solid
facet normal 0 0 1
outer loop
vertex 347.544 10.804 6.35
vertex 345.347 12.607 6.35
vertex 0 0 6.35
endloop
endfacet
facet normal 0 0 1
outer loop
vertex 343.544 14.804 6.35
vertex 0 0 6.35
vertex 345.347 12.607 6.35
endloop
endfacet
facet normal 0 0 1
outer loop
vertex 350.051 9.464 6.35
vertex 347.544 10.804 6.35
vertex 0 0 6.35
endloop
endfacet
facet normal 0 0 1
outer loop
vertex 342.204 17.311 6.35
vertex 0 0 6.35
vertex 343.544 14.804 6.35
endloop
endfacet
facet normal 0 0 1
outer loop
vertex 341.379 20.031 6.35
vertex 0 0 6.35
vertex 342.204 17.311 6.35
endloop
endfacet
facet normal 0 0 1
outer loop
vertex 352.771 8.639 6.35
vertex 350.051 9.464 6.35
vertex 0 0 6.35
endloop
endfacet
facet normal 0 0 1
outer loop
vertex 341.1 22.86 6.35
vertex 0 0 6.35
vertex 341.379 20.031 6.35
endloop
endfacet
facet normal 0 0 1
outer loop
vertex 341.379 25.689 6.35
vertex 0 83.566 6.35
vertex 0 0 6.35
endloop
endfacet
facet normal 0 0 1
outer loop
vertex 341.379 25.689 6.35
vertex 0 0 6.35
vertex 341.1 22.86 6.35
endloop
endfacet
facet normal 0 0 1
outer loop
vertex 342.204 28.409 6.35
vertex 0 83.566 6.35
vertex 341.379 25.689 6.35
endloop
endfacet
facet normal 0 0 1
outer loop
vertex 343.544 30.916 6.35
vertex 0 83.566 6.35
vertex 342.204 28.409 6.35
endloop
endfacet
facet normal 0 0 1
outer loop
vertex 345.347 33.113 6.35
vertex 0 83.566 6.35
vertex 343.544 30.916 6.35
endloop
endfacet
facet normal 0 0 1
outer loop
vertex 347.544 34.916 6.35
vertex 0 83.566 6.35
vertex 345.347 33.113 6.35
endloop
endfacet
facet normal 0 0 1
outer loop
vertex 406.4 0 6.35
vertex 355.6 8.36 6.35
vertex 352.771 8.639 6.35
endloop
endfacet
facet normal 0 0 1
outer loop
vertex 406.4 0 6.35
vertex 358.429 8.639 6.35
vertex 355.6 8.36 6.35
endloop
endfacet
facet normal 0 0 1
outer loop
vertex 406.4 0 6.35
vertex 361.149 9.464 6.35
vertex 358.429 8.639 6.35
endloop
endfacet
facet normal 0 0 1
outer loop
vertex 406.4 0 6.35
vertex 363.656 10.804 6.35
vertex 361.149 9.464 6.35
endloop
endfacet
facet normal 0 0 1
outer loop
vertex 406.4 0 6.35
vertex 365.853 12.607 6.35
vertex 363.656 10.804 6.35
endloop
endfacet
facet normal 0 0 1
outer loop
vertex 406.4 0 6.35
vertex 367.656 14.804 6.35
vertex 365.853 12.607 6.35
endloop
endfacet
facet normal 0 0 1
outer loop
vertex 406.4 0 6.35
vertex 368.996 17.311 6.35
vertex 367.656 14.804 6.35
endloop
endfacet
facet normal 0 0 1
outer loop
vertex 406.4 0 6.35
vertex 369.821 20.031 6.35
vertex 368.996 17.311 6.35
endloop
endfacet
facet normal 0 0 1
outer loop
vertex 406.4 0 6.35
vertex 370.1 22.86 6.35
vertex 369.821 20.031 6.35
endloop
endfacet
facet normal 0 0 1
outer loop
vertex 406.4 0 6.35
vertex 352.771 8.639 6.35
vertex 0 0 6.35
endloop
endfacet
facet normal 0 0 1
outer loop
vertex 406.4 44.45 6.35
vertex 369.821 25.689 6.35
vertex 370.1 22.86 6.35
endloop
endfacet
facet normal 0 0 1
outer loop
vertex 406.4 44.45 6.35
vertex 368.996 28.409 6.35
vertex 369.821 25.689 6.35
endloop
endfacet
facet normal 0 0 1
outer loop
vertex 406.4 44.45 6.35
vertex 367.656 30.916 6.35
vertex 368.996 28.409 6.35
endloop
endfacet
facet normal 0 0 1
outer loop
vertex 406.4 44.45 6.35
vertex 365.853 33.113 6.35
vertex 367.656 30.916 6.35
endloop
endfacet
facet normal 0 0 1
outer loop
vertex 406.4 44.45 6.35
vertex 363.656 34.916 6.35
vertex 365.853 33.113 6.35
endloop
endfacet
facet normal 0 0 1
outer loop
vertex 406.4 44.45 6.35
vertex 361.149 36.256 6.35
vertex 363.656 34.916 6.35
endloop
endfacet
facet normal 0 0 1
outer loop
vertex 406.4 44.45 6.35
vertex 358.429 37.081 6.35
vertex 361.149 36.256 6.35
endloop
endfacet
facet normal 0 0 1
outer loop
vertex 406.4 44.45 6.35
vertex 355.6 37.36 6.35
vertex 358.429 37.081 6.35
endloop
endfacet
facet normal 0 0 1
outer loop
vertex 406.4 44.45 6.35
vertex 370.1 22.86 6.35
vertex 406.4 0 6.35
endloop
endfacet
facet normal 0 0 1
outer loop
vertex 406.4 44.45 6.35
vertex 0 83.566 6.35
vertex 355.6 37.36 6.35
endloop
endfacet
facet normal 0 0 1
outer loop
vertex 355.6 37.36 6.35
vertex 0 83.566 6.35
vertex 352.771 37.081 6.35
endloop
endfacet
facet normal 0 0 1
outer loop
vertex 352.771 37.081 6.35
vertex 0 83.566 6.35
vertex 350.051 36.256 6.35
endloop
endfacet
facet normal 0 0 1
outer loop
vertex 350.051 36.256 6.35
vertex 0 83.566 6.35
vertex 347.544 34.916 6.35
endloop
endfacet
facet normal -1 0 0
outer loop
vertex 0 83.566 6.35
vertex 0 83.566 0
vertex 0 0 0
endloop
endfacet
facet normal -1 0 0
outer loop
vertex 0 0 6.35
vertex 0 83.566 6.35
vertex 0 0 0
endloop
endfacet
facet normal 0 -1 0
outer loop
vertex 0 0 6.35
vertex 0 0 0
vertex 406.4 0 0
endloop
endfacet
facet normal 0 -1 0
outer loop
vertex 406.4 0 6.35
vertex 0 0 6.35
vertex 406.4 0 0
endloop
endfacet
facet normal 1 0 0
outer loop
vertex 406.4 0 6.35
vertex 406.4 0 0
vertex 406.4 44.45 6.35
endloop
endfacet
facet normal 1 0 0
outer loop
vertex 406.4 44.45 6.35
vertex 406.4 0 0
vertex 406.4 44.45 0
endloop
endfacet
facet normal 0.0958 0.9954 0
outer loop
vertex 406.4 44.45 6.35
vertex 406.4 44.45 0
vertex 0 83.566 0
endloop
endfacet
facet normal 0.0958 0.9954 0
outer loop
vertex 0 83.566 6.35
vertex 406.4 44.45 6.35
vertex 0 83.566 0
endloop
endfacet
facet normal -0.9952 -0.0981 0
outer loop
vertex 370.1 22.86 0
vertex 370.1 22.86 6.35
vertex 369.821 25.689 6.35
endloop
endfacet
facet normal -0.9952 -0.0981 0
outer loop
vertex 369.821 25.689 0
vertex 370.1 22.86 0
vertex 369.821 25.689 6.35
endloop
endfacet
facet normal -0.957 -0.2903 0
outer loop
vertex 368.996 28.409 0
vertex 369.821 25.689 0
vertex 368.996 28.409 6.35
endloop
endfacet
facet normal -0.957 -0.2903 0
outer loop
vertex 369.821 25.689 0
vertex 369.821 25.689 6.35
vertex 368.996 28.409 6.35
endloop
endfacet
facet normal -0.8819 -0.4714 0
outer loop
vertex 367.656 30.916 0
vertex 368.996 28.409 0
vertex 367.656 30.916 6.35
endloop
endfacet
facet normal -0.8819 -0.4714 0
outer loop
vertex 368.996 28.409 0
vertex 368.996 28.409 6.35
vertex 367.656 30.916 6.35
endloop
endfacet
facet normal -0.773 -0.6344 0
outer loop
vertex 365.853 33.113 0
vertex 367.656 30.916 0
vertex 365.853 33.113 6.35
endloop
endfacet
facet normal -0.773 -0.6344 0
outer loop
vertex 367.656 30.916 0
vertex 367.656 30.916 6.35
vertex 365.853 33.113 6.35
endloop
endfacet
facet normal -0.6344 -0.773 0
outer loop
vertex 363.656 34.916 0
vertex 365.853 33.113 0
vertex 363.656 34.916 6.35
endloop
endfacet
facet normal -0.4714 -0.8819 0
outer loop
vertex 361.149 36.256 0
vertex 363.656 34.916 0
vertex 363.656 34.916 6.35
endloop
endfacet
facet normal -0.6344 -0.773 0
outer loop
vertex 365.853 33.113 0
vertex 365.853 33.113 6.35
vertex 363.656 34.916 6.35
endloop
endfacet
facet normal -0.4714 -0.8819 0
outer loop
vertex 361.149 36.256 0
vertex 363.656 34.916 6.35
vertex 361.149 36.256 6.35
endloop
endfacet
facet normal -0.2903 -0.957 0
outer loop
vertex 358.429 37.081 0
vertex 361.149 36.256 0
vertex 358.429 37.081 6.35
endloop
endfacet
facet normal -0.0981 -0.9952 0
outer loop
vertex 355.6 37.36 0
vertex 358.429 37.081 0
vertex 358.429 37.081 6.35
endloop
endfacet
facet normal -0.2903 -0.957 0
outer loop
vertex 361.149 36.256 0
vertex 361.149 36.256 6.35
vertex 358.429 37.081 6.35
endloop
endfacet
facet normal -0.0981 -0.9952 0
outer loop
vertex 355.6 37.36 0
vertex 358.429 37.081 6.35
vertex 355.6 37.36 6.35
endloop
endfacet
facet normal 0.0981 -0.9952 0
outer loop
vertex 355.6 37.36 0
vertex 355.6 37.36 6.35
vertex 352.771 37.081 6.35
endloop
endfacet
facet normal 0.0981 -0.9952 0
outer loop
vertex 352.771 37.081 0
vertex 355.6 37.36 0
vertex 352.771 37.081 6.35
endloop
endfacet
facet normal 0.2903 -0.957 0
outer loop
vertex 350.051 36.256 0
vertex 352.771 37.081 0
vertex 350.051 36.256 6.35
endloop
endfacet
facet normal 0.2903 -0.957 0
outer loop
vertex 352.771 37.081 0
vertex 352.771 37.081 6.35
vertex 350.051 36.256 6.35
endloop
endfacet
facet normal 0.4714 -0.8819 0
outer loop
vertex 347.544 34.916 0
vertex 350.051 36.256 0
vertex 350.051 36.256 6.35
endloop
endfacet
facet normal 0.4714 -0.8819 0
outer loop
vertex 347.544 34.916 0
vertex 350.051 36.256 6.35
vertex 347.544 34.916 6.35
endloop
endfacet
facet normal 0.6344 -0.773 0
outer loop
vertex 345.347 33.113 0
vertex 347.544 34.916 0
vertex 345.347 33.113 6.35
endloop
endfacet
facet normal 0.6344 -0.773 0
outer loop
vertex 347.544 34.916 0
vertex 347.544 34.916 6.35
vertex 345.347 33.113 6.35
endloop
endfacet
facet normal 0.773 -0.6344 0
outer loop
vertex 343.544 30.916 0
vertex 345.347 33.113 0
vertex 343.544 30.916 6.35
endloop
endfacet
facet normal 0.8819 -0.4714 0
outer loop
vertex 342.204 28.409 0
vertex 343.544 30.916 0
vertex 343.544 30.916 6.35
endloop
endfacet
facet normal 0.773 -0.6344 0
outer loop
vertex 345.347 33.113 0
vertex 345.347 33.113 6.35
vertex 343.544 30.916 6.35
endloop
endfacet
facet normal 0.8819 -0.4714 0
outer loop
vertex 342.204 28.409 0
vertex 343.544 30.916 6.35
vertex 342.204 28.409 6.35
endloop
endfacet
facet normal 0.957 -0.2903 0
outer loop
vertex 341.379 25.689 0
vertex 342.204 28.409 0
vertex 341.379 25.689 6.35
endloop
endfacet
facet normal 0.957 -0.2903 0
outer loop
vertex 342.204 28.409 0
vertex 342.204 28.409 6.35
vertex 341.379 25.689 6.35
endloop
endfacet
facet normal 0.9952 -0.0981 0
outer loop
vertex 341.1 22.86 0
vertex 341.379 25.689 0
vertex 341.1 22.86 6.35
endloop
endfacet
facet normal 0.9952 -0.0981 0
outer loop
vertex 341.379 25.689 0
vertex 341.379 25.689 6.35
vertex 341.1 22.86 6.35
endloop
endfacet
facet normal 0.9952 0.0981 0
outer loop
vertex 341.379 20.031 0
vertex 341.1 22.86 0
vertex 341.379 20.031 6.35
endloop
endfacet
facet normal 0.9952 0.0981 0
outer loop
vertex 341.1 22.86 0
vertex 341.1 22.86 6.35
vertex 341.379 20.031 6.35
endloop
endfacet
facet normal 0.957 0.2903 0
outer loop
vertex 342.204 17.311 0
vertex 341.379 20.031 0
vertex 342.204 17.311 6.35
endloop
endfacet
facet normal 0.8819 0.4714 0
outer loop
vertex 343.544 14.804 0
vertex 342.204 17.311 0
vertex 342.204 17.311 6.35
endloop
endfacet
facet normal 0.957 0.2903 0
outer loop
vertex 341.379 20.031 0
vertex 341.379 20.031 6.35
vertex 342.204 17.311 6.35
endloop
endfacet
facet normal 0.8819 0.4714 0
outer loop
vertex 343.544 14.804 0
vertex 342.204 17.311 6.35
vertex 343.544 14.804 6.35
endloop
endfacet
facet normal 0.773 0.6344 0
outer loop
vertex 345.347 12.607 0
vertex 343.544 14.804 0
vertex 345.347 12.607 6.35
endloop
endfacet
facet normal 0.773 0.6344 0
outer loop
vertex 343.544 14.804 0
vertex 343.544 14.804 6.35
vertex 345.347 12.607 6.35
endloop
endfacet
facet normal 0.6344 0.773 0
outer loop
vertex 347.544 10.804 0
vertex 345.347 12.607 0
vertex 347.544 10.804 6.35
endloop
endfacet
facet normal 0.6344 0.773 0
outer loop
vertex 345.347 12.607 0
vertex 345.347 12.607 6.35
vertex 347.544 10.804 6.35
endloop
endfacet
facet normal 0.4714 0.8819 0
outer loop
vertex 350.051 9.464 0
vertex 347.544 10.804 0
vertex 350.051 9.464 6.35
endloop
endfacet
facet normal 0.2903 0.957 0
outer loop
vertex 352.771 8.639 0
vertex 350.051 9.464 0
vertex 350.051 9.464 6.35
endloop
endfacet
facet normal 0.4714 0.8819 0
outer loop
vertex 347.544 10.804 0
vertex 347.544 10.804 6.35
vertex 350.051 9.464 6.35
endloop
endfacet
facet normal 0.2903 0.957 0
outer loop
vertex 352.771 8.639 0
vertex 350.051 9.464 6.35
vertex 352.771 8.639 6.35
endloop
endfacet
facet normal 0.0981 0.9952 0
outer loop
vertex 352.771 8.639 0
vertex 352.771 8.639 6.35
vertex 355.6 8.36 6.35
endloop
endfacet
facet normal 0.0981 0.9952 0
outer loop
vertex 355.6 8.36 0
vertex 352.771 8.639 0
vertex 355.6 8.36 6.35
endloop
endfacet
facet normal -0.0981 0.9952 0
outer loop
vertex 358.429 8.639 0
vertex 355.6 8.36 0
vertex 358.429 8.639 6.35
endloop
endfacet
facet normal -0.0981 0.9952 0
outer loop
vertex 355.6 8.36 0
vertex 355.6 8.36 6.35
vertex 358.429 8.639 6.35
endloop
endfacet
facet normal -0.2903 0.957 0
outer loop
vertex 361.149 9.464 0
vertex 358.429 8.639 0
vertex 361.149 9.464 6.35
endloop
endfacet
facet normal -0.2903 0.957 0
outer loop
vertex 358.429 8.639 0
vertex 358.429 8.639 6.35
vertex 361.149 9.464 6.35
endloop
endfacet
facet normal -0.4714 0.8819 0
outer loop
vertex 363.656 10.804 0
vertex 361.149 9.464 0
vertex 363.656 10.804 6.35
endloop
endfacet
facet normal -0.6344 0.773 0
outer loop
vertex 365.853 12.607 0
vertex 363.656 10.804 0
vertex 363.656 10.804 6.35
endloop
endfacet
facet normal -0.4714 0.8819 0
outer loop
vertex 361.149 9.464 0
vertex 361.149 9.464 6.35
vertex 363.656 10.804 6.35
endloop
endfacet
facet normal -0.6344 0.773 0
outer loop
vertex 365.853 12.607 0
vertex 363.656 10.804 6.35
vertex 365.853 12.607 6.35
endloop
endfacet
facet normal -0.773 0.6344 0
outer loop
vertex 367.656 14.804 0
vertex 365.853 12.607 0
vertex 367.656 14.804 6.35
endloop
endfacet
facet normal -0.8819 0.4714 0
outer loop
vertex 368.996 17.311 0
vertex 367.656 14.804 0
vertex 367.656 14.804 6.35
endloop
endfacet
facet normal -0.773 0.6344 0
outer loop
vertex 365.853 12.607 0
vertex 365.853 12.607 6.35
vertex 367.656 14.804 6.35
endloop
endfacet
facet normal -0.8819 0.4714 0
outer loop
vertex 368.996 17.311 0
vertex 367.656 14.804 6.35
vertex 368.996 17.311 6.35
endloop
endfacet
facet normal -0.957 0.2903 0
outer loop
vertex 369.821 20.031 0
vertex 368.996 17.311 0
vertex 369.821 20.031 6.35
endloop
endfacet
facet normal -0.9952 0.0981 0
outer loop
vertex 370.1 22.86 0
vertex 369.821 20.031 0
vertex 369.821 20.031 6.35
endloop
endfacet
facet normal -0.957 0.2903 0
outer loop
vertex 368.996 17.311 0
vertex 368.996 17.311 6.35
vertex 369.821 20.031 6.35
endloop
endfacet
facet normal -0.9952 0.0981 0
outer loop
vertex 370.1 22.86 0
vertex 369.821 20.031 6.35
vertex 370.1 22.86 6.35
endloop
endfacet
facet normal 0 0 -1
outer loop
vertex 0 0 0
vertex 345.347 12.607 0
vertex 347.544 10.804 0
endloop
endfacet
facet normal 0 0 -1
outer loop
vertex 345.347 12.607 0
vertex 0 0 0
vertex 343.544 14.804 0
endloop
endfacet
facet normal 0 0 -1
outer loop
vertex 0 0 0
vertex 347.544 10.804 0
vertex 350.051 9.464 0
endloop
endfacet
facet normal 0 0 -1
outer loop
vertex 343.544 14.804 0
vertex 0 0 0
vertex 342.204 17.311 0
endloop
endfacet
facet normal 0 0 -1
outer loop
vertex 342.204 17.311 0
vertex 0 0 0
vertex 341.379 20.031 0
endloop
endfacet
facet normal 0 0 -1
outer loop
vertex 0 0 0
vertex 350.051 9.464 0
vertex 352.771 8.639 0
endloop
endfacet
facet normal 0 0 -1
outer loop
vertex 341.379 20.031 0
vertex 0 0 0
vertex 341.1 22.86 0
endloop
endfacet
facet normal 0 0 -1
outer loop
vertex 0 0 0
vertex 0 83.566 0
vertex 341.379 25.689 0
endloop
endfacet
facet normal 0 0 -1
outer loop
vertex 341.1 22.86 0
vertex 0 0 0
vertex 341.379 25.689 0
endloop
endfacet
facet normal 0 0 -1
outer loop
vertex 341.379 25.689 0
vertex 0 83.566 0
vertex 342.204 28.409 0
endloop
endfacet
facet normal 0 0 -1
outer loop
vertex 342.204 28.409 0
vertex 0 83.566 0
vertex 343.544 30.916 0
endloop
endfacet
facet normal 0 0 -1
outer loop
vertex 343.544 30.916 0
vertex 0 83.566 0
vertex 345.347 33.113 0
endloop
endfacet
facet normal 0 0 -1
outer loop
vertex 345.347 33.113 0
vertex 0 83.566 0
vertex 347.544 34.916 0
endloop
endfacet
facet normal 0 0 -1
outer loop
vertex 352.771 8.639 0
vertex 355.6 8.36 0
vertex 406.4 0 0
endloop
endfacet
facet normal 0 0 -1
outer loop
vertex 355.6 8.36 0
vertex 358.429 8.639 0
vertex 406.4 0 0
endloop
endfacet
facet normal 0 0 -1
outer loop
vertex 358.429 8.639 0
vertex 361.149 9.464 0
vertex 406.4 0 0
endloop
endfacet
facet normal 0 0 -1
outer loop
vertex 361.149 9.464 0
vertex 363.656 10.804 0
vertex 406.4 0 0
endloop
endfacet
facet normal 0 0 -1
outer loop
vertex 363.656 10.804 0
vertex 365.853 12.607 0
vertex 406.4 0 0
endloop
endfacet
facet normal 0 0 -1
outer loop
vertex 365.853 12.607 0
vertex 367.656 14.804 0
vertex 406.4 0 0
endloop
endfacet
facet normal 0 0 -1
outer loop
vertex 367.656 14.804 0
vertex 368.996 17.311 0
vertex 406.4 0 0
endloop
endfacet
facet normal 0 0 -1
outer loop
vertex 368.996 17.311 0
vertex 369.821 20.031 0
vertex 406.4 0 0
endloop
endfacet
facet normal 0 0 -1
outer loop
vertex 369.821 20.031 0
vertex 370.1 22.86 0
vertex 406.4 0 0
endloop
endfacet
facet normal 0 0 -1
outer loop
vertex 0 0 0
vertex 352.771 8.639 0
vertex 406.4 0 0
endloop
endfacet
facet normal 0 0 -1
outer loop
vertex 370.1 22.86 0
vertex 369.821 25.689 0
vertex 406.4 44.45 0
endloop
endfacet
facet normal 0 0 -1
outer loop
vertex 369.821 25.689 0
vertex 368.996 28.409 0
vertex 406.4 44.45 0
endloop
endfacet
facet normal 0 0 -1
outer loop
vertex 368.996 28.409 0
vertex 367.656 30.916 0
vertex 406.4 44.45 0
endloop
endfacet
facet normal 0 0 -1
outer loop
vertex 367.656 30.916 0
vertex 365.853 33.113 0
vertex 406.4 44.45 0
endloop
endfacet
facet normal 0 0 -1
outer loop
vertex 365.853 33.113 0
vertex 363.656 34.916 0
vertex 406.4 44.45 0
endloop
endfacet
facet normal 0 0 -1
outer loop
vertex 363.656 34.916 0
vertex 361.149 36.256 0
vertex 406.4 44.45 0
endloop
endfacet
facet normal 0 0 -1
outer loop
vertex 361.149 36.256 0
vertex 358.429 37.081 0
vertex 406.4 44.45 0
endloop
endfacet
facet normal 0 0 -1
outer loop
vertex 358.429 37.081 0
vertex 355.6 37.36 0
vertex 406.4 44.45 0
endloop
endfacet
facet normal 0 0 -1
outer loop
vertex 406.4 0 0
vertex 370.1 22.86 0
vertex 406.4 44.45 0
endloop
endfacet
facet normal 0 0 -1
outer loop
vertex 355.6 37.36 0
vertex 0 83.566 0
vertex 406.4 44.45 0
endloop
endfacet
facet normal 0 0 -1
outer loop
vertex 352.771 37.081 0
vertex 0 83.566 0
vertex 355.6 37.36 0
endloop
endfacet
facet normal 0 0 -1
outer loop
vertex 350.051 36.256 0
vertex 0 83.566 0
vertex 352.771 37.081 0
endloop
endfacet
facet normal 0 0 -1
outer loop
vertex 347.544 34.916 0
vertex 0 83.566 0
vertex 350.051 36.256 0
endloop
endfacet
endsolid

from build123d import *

# Parameters (mm, degrees)
BOSS_EXTRUDE1_DEPTH = 6.35
SKETCH2_R           = 14.499971
CUT_EXTRUDE1_DEPTH  = 6.35


with BuildPart() as part:
    # Sketch1 → Boss-Extrude1 (new body)
    with BuildSketch(Plane.XY):
        Polygon((0, 0), (406.4, 0), (406.4, 44.45), (0, 83.566), align=None)
    extrude(amount=BOSS_EXTRUDE1_DEPTH)

    # Sketch2 → Cut-Extrude1 (cut)
    with BuildSketch(Plane.XY.offset(6.35)):
        with Locations((355.6, 22.86)):
            Circle(SKETCH2_R)
    extrude(amount=-CUT_EXTRUDE1_DEPTH, mode=Mode.SUBTRACT)


solid = part.part
